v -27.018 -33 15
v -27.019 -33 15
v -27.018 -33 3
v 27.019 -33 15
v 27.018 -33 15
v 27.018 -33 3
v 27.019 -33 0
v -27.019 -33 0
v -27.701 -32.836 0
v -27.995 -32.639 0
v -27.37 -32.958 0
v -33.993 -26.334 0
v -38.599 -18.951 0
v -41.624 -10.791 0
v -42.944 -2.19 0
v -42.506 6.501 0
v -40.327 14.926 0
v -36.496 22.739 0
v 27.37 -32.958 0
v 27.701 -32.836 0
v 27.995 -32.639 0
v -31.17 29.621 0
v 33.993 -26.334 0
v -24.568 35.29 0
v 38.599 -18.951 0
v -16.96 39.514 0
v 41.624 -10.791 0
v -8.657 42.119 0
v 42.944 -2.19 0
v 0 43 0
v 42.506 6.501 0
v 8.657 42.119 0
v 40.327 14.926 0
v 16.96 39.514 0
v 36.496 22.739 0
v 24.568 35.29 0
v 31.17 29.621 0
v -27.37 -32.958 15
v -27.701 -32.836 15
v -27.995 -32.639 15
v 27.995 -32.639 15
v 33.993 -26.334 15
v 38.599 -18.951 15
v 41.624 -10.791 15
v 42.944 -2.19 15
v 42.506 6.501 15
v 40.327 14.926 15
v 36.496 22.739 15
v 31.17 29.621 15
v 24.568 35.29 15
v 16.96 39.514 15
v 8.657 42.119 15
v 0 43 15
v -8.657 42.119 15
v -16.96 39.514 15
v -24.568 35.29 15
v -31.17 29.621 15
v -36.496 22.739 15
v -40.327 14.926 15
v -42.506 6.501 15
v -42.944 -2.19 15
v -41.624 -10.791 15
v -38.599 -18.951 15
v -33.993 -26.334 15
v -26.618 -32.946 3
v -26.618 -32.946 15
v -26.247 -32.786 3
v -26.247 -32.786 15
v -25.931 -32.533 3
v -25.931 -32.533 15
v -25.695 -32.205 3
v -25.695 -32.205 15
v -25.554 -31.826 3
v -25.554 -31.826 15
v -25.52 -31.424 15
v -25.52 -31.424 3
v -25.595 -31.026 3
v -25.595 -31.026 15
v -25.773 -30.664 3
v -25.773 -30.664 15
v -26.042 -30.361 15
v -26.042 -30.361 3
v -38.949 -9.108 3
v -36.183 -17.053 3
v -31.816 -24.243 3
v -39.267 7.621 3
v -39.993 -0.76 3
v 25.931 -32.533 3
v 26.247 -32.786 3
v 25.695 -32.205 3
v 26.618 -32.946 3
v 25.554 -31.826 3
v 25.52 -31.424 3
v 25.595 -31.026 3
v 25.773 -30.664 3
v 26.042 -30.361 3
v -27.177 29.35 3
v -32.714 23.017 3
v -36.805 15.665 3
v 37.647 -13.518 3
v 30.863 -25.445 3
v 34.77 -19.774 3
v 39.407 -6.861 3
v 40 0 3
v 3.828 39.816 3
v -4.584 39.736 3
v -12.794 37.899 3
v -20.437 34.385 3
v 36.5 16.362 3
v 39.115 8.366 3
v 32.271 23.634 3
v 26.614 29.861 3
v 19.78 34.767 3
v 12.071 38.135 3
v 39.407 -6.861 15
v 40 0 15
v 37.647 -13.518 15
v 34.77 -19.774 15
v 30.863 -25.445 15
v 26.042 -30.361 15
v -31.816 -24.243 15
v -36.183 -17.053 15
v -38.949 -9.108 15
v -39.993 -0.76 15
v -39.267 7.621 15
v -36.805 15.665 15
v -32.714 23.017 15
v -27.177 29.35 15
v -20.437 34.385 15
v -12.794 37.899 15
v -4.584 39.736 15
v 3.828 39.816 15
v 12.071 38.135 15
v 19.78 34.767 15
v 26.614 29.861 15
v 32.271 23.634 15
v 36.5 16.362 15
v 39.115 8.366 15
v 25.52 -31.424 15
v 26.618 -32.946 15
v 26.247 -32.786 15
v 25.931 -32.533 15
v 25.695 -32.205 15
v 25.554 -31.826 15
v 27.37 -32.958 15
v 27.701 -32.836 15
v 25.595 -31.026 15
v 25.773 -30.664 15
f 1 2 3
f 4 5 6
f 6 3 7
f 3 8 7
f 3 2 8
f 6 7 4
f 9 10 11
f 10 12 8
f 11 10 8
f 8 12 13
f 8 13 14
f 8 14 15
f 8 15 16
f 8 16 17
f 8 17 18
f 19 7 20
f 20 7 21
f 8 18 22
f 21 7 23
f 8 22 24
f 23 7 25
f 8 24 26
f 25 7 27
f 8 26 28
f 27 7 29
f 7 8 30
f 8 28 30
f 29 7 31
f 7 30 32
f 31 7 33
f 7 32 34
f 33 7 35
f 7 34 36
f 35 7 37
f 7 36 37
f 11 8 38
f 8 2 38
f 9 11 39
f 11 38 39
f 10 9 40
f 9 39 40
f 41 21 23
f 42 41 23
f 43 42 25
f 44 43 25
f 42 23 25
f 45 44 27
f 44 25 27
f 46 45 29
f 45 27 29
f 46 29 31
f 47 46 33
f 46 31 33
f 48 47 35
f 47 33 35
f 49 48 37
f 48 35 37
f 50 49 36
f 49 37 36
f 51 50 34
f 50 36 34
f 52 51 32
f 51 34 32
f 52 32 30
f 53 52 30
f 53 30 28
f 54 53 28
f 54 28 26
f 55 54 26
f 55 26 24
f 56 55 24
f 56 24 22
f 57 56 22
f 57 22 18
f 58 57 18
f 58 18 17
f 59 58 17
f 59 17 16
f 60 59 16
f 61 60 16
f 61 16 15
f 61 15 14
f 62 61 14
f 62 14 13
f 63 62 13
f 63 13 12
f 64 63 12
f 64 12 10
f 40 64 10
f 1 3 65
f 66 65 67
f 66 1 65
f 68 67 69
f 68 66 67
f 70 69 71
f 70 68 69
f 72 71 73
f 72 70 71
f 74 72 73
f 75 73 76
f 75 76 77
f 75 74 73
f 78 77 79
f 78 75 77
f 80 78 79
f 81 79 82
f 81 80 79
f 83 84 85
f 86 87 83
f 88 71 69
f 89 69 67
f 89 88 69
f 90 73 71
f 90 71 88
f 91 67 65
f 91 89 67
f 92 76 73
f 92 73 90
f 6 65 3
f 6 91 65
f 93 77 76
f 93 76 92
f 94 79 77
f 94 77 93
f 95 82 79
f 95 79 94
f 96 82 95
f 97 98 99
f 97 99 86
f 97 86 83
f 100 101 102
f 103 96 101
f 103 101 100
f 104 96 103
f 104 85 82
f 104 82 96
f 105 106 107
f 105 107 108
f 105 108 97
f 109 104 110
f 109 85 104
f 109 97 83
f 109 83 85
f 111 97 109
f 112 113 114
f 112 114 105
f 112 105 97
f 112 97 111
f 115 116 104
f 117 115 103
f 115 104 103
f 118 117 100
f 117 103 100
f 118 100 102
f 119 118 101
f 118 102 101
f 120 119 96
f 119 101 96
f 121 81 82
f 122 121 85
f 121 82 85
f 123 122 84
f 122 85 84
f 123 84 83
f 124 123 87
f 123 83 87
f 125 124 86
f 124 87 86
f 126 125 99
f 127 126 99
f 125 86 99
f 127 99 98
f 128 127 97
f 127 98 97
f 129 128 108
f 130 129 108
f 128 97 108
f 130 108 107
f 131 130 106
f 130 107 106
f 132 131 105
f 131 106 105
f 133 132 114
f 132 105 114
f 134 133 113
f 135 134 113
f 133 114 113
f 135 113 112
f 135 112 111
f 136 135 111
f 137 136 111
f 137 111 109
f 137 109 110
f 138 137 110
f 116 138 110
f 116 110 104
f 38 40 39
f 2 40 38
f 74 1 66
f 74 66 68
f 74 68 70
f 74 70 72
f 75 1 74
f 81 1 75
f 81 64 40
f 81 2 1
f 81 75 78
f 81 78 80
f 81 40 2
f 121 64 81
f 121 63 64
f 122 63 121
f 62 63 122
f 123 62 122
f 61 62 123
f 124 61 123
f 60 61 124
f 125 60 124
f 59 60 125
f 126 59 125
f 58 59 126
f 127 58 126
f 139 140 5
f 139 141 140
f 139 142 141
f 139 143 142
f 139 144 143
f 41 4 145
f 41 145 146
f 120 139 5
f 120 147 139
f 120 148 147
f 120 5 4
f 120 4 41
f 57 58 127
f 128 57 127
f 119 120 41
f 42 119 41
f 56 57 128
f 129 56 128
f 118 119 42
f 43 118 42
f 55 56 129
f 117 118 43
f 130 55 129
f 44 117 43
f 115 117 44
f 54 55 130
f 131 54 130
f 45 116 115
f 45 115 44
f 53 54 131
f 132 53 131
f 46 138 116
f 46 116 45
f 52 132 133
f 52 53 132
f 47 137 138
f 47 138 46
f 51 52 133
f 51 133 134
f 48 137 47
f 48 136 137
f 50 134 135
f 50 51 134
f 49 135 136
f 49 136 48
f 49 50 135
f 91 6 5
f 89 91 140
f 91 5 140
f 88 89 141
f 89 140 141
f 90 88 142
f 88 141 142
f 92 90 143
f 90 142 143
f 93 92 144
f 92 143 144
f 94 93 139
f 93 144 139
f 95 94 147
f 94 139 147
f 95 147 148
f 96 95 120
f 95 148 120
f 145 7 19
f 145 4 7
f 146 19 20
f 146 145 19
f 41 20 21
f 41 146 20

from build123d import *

# Parameters (mm, degrees)
F1_DEPTH = 15
F2_DEPTH = 3
F3_R     = 1.49999


# Not quite as in the source:
# - a fillet or chamfer is up to 0.001 mm smaller than in the source, because OpenCascade refuses the exact size


with BuildPart() as f1:
    # F0 (on Top) → F1 (new body)
    with BuildSketch(Plane.XY):
        with BuildLine():
            ThreePointArc((-22.6053091109, -33), (-18.6519119069, 35.3851124376), (40, 0))
            ThreePointArc((40, 0), (35.3851124376, -18.6519119069), (22.6053091109, -33))
            Line((22.6053091109, -33), (27.5680975042, -33))
            ThreePointArc((27.5680975042, -33), (38.9514325326, -18.2149911792), (43, 0))
            ThreePointArc((43, 0), (-18.2149911792, 38.9514325326), (-27.5680975042, -33))
            Line((-27.5680975042, -33), (-22.6053091109, -33))
        make_face()
    extrude(amount=F1_DEPTH)

    # F0 (on Top) → F2 (join)
    with BuildSketch(Plane.XY):
        with BuildLine():
            ThreePointArc((22.6053091109, -33), (35.3851124376, -18.6519119069), (40, 0))
            ThreePointArc((40, 0), (-18.6519119069, 35.3851124376), (-22.6053091109, -33))
            Line((-22.6053091109, -33), (22.6053091109, -33))
        make_face()
    extrude(amount=F2_DEPTH)

    # F3 (radius 1.5 in the source; OpenCascade refuses exactly that, so slightly less here)
    f3_edges = [f1.edges().sort_by_distance(p)[0] for p in [
        (-22.605309, -33, 9),
        (22.605309, -33, 9),
        (-27.568098, -33, 7.5),
        (27.568098, -33, 7.5),
    ]]
    fillet(f3_edges, radius=F3_R)


solid = f1.part
